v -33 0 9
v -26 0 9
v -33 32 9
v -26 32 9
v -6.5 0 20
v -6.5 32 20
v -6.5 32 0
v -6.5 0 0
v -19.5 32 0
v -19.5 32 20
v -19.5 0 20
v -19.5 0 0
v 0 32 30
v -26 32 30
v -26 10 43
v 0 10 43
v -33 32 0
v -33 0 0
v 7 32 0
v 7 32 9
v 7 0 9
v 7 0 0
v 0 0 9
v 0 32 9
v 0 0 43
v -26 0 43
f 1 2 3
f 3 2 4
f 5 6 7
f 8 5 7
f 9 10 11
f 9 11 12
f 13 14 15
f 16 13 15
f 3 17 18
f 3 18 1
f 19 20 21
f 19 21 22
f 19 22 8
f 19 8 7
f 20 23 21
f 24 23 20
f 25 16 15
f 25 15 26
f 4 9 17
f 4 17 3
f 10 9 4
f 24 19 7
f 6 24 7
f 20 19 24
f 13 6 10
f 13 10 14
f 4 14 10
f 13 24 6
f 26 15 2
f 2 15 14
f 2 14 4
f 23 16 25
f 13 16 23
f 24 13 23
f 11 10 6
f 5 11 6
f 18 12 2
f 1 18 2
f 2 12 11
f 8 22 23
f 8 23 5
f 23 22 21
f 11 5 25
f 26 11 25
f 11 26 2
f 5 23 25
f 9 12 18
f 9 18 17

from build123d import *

# Parameters (mm, degrees)
BOSS_EXTRUDE2_DEPTH = 26
SKETCH2_W           = 9
SKETCH2_H           = 32
BOSS_EXTRUDE3_DEPTH = 7
SKETCH3_W           = 9
SKETCH3_H           = 32
BOSS_EXTRUDE4_DEPTH = 7
SKETCH4_W           = 13
SKETCH4_H           = 20
CUT_EXTRUDE2_DEPTH  = 34


with BuildPart() as part:
    # Sketch1 → Boss-Extrude2 (new body)
    with BuildSketch(Plane(origin=(0, 0, 0), x_dir=(0, 0, -1), z_dir=(1, 0, 0))):
        Polygon((-43, 0), (0, 0), (0, 32), (-30, 32), (-43, 10), align=None)
    extrude(amount=-BOSS_EXTRUDE2_DEPTH)

    # Sketch2 → Boss-Extrude3 (add)
    with BuildSketch(Plane(origin=(0, 0, 0), x_dir=(0, 0, -1), z_dir=(1, 0, 0))):
        with Locations((-4.5, 16)):
            Rectangle(SKETCH2_W, SKETCH2_H)
    extrude(amount=BOSS_EXTRUDE3_DEPTH)

    # Sketch3 → Boss-Extrude4 (add)
    with BuildSketch(Plane.ZY.offset(26)):
        with Locations((4.5, 16)):
            Rectangle(SKETCH3_W, SKETCH3_H)
    extrude(amount=BOSS_EXTRUDE4_DEPTH)

    # Sketch4 → Cut-Extrude2 (cut)
    with BuildSketch(Plane(origin=(0, 32, 0), x_dir=(1, 0, 0), z_dir=(0, 1, 0))):
        with Locations((-13, -10)):
            Rectangle(SKETCH4_W, SKETCH4_H)
    extrude(amount=-CUT_EXTRUDE2_DEPTH, mode=Mode.SUBTRACT)


solid = part.part
